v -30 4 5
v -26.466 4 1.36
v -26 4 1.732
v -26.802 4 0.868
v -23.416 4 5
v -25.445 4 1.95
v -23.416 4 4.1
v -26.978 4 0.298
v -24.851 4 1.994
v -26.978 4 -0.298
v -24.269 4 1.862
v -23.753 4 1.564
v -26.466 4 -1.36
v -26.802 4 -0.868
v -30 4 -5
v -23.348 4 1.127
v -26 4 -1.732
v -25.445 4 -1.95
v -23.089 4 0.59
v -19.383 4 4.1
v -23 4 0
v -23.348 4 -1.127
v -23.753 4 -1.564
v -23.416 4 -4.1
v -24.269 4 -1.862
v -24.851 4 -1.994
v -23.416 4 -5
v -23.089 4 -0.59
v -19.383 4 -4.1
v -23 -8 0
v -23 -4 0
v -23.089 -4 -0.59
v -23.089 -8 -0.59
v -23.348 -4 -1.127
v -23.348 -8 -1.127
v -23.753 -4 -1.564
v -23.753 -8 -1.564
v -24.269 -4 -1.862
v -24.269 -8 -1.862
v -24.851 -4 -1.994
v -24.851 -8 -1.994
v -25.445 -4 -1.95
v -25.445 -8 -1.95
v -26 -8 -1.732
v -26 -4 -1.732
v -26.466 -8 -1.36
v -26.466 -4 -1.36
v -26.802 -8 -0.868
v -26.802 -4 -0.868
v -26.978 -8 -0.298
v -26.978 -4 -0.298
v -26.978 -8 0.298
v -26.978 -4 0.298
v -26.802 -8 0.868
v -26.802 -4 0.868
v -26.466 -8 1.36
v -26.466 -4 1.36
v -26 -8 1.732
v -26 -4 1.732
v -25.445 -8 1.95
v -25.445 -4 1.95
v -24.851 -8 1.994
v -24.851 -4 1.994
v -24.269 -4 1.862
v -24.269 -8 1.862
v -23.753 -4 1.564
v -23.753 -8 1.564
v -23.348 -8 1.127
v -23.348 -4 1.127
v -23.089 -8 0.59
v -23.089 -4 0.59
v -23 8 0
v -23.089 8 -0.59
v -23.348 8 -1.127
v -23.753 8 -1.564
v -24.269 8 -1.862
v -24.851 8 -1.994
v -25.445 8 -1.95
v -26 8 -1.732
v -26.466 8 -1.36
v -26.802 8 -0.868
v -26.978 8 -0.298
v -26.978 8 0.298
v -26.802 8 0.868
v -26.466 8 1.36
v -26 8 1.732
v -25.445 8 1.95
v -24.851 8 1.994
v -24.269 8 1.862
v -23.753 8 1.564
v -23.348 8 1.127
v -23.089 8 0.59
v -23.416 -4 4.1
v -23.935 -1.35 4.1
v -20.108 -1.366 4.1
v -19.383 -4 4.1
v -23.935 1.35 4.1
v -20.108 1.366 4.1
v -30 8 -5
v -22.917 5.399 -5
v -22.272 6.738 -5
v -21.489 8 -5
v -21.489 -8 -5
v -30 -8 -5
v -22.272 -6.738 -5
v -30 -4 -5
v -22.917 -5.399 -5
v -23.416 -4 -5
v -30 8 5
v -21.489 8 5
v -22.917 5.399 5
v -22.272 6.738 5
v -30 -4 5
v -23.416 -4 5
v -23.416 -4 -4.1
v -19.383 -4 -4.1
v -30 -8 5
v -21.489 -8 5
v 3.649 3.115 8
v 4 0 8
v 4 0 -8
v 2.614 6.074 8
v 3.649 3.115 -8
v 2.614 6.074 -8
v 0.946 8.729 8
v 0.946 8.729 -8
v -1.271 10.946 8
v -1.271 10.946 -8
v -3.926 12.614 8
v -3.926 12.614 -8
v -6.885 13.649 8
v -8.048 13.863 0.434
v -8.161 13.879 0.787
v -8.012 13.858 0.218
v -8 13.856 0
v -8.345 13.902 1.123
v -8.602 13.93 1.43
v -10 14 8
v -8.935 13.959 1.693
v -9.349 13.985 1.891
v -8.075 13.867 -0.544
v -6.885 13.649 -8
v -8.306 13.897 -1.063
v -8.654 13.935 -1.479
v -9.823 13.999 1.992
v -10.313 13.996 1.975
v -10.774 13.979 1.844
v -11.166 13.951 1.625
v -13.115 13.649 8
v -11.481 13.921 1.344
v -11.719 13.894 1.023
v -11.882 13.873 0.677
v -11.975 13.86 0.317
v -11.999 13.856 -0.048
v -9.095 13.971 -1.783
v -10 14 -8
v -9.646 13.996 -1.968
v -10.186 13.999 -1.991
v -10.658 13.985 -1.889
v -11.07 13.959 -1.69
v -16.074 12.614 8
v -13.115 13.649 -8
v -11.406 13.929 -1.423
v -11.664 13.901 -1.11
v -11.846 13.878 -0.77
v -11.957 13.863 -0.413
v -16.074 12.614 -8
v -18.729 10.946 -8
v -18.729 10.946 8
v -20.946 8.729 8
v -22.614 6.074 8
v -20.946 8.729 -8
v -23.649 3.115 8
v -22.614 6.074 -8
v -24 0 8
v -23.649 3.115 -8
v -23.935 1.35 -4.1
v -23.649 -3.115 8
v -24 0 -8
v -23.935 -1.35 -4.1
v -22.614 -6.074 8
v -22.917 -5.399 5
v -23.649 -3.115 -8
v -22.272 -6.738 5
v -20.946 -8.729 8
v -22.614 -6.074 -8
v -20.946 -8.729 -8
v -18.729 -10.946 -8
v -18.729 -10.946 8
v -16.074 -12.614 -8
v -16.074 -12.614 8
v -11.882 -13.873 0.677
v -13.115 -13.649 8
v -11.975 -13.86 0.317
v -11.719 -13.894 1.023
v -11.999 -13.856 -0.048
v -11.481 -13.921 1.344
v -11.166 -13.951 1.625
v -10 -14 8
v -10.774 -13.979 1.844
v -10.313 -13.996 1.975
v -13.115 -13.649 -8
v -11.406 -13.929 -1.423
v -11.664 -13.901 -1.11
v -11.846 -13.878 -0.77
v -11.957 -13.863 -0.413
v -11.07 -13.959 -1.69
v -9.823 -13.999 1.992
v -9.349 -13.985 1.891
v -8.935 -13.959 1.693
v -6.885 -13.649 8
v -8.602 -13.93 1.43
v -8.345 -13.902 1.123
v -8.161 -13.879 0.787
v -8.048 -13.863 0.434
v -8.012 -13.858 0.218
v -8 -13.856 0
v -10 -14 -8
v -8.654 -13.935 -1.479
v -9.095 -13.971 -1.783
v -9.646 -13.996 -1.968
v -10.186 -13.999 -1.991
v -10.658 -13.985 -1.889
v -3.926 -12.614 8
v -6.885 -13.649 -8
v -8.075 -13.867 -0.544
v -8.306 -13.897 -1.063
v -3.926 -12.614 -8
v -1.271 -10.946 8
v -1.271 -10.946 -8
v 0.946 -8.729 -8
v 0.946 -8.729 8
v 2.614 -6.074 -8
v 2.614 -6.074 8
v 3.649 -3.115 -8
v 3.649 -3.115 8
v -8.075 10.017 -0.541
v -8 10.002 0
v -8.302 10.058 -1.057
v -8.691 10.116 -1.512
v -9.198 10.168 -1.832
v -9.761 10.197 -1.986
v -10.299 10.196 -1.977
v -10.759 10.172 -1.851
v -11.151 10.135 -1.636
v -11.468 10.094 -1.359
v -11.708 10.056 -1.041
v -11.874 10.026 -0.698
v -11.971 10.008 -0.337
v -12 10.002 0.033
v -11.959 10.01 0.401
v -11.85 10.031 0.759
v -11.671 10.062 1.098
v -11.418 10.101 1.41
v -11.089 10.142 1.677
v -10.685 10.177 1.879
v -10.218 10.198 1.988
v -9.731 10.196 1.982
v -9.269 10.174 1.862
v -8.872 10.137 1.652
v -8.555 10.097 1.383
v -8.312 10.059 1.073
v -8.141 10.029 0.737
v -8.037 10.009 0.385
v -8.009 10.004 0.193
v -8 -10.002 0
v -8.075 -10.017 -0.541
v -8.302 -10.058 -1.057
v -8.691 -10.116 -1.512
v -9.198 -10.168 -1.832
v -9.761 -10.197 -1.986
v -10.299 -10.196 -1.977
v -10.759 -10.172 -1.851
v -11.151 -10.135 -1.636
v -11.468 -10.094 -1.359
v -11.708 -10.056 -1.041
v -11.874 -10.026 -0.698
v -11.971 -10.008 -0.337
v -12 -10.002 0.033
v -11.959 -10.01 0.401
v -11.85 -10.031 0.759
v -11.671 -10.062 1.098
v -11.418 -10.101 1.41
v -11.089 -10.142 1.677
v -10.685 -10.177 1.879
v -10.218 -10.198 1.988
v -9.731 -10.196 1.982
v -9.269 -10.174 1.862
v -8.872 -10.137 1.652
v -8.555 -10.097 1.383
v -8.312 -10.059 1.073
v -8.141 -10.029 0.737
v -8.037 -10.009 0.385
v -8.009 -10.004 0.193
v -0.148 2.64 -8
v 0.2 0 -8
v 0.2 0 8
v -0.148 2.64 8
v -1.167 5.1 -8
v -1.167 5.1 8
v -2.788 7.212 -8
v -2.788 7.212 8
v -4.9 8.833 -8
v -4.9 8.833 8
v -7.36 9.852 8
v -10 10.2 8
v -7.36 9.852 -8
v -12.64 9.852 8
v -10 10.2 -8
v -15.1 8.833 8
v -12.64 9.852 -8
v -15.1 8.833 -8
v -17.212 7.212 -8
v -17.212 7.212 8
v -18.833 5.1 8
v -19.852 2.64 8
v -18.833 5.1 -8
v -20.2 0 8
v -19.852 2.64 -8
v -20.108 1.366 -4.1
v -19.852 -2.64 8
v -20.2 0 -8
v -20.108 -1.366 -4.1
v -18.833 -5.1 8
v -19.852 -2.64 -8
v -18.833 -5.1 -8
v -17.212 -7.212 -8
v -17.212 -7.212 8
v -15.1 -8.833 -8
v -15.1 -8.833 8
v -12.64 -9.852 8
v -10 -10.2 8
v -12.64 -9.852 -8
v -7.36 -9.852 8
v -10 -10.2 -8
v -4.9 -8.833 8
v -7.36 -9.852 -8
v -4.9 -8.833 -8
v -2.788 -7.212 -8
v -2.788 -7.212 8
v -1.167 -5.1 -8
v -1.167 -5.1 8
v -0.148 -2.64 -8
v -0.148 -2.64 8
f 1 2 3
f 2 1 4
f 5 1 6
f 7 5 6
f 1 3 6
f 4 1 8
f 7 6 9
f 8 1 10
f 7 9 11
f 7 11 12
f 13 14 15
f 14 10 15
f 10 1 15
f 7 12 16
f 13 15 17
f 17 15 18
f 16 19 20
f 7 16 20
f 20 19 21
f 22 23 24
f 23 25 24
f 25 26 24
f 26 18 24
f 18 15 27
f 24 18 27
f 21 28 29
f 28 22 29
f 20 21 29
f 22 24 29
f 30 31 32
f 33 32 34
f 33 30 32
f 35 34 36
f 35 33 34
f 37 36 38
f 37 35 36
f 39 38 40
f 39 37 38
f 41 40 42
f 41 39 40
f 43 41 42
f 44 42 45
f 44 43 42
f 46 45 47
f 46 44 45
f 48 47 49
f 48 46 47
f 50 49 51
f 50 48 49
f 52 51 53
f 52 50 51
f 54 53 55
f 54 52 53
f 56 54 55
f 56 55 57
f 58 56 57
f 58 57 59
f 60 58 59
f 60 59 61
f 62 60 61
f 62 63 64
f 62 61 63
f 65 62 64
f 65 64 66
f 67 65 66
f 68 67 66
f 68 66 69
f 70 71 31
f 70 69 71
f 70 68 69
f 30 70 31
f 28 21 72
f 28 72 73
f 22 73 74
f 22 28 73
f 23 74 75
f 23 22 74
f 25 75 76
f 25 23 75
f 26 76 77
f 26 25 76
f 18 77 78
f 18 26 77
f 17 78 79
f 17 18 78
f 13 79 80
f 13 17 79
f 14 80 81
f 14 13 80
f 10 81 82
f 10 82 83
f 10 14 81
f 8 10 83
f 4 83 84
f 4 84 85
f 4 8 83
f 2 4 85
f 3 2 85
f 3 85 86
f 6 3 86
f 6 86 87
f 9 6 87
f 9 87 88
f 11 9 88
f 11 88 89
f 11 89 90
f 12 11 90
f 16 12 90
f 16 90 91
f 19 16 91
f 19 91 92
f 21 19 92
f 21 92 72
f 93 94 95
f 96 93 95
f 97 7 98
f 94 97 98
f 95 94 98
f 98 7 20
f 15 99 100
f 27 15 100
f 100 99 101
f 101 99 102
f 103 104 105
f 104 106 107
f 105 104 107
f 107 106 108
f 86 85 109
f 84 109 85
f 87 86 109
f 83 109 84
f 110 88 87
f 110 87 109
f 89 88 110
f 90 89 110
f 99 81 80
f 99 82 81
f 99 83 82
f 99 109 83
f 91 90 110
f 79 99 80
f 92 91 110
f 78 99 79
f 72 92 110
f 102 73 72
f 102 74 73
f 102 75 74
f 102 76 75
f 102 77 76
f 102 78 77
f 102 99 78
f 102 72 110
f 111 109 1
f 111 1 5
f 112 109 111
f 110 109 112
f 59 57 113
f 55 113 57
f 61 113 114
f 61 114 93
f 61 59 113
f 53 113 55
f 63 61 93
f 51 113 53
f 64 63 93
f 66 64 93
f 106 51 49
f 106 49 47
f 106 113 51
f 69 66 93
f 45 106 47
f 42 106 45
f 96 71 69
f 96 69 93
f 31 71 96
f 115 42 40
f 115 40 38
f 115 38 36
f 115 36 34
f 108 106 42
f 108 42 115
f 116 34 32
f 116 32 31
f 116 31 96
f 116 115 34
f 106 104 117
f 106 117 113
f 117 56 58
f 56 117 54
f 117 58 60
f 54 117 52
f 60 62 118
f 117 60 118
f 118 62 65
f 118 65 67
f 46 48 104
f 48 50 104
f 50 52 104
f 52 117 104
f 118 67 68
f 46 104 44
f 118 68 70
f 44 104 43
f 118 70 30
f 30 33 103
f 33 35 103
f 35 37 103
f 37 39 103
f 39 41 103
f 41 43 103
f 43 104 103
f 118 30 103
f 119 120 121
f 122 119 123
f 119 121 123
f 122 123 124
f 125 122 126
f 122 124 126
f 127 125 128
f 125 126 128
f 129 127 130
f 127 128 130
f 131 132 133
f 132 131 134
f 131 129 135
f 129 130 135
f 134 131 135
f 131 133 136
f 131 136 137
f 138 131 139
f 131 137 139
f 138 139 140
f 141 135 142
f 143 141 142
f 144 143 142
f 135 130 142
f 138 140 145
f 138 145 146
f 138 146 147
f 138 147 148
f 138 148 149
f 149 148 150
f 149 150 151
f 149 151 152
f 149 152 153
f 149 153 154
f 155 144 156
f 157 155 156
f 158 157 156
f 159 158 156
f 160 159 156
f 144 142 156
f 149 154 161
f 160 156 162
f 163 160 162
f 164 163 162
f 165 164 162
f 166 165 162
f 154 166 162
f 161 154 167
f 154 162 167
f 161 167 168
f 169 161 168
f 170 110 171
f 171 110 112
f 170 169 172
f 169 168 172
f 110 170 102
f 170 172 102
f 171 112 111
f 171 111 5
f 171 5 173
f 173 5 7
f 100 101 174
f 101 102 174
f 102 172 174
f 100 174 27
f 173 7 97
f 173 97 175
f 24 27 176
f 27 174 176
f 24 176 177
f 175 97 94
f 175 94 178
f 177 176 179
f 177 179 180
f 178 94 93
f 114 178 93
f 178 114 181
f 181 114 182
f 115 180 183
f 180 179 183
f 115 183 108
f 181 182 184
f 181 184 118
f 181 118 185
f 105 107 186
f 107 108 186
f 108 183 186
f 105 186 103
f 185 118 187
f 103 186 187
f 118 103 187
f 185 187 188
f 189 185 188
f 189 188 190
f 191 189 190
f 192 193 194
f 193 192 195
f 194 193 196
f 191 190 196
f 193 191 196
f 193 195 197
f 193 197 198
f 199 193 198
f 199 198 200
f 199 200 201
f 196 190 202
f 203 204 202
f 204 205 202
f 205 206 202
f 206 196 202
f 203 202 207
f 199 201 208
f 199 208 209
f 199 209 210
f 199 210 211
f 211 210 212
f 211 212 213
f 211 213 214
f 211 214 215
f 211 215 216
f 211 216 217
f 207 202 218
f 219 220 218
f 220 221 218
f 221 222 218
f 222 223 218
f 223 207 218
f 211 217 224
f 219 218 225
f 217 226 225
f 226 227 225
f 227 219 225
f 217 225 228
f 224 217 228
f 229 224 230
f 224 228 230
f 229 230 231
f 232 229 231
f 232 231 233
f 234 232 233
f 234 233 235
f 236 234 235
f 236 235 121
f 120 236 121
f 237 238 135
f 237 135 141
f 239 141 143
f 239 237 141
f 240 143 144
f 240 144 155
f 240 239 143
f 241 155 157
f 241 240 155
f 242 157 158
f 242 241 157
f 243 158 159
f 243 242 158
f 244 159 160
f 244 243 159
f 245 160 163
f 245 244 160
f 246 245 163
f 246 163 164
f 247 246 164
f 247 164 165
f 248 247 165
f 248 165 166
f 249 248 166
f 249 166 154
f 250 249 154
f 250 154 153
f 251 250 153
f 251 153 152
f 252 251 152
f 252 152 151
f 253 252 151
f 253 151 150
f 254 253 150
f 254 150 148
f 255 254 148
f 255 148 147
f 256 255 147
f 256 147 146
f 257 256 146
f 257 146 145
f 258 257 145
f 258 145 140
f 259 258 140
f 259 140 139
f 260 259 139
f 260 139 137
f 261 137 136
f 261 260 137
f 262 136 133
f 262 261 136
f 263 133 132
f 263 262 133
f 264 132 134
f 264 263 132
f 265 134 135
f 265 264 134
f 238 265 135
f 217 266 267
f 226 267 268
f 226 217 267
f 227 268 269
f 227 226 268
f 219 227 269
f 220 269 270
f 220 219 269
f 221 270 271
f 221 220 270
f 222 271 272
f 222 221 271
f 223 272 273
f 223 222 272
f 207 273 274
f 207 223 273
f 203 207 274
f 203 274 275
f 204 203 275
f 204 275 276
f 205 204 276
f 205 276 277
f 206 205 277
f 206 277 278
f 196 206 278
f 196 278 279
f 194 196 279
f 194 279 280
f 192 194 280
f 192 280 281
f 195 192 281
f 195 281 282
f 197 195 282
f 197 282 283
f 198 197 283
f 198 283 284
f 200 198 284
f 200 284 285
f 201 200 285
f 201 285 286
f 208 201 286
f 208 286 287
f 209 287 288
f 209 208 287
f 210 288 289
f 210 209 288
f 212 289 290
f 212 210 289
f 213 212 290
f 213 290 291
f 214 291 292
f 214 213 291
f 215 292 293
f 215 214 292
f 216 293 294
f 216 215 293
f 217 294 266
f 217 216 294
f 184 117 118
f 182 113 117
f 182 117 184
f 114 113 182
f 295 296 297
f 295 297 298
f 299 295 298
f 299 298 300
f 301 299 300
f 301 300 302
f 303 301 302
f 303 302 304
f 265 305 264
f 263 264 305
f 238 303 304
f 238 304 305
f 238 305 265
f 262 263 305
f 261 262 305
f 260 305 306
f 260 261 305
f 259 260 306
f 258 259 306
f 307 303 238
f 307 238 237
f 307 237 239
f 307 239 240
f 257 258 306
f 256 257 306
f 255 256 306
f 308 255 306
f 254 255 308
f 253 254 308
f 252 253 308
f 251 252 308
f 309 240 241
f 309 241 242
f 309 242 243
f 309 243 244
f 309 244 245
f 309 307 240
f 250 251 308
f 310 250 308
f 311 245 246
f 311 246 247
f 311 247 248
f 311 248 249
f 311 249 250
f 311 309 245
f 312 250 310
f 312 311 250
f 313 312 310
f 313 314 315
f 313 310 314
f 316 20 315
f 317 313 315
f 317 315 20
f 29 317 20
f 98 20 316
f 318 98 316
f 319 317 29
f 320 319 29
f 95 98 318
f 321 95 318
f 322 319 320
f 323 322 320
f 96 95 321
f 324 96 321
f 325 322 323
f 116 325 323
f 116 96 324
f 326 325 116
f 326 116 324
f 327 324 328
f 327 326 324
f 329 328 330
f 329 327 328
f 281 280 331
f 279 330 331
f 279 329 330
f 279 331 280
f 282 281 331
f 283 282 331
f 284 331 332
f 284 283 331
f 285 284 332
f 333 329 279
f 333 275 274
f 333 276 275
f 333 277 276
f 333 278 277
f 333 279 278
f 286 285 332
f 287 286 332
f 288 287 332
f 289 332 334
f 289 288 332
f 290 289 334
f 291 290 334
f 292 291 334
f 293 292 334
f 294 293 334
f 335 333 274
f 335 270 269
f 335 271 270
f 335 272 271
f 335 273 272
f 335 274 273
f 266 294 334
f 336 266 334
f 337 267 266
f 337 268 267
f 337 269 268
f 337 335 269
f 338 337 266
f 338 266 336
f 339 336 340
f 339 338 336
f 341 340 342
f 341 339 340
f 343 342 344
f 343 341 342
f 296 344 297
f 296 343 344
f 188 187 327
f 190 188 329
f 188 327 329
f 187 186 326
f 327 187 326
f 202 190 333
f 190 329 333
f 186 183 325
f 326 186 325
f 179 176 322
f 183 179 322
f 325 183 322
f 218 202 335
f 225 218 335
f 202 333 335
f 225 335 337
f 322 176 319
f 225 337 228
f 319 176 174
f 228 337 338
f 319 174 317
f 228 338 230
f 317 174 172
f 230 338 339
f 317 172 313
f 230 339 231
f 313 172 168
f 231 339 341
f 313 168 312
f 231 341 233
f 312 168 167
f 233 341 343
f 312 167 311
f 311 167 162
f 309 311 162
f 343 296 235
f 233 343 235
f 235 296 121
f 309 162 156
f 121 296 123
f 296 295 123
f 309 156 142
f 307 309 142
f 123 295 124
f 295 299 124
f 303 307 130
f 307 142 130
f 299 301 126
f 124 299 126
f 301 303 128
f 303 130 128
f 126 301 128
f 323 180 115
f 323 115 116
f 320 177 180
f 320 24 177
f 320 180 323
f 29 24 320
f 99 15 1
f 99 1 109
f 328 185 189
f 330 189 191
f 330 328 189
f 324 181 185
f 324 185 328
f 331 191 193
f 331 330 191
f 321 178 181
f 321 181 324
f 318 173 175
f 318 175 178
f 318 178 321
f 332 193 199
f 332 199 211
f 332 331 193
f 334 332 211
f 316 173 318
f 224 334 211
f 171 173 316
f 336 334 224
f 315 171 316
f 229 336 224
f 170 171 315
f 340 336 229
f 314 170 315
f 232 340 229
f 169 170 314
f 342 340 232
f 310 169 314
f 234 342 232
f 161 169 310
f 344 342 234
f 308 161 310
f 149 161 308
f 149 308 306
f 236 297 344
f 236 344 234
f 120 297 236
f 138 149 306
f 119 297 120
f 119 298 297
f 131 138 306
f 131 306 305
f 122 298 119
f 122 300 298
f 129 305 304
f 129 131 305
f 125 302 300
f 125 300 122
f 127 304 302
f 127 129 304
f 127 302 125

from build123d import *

# Parameters (mm, degrees)
CYLINDER004_R          = 2
CYLINDER004_DEPTH      = 16
CYLINDER004_ROLL_ANGLE = -90
BOX001_W               = 5
BOX001_H               = 8
BOX001_DEPTH           = 8.2
CYLINDER006_R          = 2
CYLINDER006_DEPTH      = 30
CYLINDER006_ROLL_ANGLE = -90
CYLINDER002_R          = 10.2
CYLINDER002_DEPTH      = 28
BOX_W                  = 10
BOX_H                  = 4
BOX_DEPTH              = 10
BOX002_W               = 10
BOX002_H               = 4
BOX002_DEPTH           = 10
CYLINDER_R             = 14
CYLINDER_DEPTH         = 16


with BuildPart() as cylinder004:
    # Cylinder004 → Cylinder004 (new body)
    with BuildSketch(Plane.XY):
        Circle(CYLINDER004_R)
    extrude(amount=CYLINDER004_DEPTH)


with BuildPart() as cylinder004_1:
    # Cylinder004 roll: moved
    add(cylinder004.part.rotate(Axis((0, 0, 0), (1, 0, 0)), CYLINDER004_ROLL_ANGLE))


with BuildPart() as cylinder004_2:
    # Cylinder004 placement: moved
    add(cylinder004_1.part.moved(Location((-25, -8, 0))))


with BuildPart() as cube001:
    # Box001 → Box001 (new body)
    with BuildSketch(Plane(origin=(-24, -4, -4.1), x_dir=(1, 0, 0), z_dir=(0, 0, 1))):
        with Locations((2.5, 4)):
            Rectangle(BOX001_W, BOX001_H)
    extrude(amount=BOX001_DEPTH)


with BuildPart() as cylinder006:
    # Cylinder006 → Cylinder006 (new body)
    with BuildSketch(Plane.XY):
        Circle(CYLINDER006_R)
    extrude(amount=CYLINDER006_DEPTH)


with BuildPart() as cylinder006_1:
    # Cylinder006 roll: moved
    add(cylinder006.part.rotate(Axis((0, 0, 0), (1, 0, 0)), CYLINDER006_ROLL_ANGLE))


with BuildPart() as cylinder006_2:
    # Cylinder006 placement: moved
    add(cylinder006_1.part.moved(Location((-10, -15, 0))))


with BuildPart() as negative_fusion:
    # Cylinder002 → Cylinder002 (new body)
    with BuildSketch(Plane(origin=(-10, 0, -10), x_dir=(1, 0, 0), z_dir=(0, 0, 1))):
        Circle(CYLINDER002_R)
    extrude(amount=CYLINDER002_DEPTH)

    # Fusion001: union Cylinder004, Cube001, Cylinder006
    add(cylinder004_2.part)
    add(cube001.part)
    add(cylinder006_2.part)


with BuildPart() as cube:
    # Box → Box (new body)
    with BuildSketch(Plane(origin=(-30, -8, -5), x_dir=(1, 0, 0), z_dir=(0, 0, 1))):
        with Locations((5, 2)):
            Rectangle(BOX_W, BOX_H)
    extrude(amount=BOX_DEPTH)


with BuildPart() as cube002:
    # Box002 → Box002 (new body)
    with BuildSketch(Plane(origin=(-30, 4, -5), x_dir=(1, 0, 0), z_dir=(0, 0, 1))):
        with Locations((5, 2)):
            Rectangle(BOX002_W, BOX002_H)
    extrude(amount=BOX002_DEPTH)


with BuildPart() as cut:
    # Cylinder → Cylinder (new body)
    with BuildSketch(Plane(origin=(-10, 0, -8), x_dir=(1, 0, 0), z_dir=(0, 0, 1))):
        Circle(CYLINDER_R)
    extrude(amount=CYLINDER_DEPTH)

    # Fusion: union Cube, Cube002
    add(cube.part)
    add(cube002.part)

    # Cut: cut Negative Fusion
    add(negative_fusion.part, mode=Mode.SUBTRACT)


solid = cut.part
